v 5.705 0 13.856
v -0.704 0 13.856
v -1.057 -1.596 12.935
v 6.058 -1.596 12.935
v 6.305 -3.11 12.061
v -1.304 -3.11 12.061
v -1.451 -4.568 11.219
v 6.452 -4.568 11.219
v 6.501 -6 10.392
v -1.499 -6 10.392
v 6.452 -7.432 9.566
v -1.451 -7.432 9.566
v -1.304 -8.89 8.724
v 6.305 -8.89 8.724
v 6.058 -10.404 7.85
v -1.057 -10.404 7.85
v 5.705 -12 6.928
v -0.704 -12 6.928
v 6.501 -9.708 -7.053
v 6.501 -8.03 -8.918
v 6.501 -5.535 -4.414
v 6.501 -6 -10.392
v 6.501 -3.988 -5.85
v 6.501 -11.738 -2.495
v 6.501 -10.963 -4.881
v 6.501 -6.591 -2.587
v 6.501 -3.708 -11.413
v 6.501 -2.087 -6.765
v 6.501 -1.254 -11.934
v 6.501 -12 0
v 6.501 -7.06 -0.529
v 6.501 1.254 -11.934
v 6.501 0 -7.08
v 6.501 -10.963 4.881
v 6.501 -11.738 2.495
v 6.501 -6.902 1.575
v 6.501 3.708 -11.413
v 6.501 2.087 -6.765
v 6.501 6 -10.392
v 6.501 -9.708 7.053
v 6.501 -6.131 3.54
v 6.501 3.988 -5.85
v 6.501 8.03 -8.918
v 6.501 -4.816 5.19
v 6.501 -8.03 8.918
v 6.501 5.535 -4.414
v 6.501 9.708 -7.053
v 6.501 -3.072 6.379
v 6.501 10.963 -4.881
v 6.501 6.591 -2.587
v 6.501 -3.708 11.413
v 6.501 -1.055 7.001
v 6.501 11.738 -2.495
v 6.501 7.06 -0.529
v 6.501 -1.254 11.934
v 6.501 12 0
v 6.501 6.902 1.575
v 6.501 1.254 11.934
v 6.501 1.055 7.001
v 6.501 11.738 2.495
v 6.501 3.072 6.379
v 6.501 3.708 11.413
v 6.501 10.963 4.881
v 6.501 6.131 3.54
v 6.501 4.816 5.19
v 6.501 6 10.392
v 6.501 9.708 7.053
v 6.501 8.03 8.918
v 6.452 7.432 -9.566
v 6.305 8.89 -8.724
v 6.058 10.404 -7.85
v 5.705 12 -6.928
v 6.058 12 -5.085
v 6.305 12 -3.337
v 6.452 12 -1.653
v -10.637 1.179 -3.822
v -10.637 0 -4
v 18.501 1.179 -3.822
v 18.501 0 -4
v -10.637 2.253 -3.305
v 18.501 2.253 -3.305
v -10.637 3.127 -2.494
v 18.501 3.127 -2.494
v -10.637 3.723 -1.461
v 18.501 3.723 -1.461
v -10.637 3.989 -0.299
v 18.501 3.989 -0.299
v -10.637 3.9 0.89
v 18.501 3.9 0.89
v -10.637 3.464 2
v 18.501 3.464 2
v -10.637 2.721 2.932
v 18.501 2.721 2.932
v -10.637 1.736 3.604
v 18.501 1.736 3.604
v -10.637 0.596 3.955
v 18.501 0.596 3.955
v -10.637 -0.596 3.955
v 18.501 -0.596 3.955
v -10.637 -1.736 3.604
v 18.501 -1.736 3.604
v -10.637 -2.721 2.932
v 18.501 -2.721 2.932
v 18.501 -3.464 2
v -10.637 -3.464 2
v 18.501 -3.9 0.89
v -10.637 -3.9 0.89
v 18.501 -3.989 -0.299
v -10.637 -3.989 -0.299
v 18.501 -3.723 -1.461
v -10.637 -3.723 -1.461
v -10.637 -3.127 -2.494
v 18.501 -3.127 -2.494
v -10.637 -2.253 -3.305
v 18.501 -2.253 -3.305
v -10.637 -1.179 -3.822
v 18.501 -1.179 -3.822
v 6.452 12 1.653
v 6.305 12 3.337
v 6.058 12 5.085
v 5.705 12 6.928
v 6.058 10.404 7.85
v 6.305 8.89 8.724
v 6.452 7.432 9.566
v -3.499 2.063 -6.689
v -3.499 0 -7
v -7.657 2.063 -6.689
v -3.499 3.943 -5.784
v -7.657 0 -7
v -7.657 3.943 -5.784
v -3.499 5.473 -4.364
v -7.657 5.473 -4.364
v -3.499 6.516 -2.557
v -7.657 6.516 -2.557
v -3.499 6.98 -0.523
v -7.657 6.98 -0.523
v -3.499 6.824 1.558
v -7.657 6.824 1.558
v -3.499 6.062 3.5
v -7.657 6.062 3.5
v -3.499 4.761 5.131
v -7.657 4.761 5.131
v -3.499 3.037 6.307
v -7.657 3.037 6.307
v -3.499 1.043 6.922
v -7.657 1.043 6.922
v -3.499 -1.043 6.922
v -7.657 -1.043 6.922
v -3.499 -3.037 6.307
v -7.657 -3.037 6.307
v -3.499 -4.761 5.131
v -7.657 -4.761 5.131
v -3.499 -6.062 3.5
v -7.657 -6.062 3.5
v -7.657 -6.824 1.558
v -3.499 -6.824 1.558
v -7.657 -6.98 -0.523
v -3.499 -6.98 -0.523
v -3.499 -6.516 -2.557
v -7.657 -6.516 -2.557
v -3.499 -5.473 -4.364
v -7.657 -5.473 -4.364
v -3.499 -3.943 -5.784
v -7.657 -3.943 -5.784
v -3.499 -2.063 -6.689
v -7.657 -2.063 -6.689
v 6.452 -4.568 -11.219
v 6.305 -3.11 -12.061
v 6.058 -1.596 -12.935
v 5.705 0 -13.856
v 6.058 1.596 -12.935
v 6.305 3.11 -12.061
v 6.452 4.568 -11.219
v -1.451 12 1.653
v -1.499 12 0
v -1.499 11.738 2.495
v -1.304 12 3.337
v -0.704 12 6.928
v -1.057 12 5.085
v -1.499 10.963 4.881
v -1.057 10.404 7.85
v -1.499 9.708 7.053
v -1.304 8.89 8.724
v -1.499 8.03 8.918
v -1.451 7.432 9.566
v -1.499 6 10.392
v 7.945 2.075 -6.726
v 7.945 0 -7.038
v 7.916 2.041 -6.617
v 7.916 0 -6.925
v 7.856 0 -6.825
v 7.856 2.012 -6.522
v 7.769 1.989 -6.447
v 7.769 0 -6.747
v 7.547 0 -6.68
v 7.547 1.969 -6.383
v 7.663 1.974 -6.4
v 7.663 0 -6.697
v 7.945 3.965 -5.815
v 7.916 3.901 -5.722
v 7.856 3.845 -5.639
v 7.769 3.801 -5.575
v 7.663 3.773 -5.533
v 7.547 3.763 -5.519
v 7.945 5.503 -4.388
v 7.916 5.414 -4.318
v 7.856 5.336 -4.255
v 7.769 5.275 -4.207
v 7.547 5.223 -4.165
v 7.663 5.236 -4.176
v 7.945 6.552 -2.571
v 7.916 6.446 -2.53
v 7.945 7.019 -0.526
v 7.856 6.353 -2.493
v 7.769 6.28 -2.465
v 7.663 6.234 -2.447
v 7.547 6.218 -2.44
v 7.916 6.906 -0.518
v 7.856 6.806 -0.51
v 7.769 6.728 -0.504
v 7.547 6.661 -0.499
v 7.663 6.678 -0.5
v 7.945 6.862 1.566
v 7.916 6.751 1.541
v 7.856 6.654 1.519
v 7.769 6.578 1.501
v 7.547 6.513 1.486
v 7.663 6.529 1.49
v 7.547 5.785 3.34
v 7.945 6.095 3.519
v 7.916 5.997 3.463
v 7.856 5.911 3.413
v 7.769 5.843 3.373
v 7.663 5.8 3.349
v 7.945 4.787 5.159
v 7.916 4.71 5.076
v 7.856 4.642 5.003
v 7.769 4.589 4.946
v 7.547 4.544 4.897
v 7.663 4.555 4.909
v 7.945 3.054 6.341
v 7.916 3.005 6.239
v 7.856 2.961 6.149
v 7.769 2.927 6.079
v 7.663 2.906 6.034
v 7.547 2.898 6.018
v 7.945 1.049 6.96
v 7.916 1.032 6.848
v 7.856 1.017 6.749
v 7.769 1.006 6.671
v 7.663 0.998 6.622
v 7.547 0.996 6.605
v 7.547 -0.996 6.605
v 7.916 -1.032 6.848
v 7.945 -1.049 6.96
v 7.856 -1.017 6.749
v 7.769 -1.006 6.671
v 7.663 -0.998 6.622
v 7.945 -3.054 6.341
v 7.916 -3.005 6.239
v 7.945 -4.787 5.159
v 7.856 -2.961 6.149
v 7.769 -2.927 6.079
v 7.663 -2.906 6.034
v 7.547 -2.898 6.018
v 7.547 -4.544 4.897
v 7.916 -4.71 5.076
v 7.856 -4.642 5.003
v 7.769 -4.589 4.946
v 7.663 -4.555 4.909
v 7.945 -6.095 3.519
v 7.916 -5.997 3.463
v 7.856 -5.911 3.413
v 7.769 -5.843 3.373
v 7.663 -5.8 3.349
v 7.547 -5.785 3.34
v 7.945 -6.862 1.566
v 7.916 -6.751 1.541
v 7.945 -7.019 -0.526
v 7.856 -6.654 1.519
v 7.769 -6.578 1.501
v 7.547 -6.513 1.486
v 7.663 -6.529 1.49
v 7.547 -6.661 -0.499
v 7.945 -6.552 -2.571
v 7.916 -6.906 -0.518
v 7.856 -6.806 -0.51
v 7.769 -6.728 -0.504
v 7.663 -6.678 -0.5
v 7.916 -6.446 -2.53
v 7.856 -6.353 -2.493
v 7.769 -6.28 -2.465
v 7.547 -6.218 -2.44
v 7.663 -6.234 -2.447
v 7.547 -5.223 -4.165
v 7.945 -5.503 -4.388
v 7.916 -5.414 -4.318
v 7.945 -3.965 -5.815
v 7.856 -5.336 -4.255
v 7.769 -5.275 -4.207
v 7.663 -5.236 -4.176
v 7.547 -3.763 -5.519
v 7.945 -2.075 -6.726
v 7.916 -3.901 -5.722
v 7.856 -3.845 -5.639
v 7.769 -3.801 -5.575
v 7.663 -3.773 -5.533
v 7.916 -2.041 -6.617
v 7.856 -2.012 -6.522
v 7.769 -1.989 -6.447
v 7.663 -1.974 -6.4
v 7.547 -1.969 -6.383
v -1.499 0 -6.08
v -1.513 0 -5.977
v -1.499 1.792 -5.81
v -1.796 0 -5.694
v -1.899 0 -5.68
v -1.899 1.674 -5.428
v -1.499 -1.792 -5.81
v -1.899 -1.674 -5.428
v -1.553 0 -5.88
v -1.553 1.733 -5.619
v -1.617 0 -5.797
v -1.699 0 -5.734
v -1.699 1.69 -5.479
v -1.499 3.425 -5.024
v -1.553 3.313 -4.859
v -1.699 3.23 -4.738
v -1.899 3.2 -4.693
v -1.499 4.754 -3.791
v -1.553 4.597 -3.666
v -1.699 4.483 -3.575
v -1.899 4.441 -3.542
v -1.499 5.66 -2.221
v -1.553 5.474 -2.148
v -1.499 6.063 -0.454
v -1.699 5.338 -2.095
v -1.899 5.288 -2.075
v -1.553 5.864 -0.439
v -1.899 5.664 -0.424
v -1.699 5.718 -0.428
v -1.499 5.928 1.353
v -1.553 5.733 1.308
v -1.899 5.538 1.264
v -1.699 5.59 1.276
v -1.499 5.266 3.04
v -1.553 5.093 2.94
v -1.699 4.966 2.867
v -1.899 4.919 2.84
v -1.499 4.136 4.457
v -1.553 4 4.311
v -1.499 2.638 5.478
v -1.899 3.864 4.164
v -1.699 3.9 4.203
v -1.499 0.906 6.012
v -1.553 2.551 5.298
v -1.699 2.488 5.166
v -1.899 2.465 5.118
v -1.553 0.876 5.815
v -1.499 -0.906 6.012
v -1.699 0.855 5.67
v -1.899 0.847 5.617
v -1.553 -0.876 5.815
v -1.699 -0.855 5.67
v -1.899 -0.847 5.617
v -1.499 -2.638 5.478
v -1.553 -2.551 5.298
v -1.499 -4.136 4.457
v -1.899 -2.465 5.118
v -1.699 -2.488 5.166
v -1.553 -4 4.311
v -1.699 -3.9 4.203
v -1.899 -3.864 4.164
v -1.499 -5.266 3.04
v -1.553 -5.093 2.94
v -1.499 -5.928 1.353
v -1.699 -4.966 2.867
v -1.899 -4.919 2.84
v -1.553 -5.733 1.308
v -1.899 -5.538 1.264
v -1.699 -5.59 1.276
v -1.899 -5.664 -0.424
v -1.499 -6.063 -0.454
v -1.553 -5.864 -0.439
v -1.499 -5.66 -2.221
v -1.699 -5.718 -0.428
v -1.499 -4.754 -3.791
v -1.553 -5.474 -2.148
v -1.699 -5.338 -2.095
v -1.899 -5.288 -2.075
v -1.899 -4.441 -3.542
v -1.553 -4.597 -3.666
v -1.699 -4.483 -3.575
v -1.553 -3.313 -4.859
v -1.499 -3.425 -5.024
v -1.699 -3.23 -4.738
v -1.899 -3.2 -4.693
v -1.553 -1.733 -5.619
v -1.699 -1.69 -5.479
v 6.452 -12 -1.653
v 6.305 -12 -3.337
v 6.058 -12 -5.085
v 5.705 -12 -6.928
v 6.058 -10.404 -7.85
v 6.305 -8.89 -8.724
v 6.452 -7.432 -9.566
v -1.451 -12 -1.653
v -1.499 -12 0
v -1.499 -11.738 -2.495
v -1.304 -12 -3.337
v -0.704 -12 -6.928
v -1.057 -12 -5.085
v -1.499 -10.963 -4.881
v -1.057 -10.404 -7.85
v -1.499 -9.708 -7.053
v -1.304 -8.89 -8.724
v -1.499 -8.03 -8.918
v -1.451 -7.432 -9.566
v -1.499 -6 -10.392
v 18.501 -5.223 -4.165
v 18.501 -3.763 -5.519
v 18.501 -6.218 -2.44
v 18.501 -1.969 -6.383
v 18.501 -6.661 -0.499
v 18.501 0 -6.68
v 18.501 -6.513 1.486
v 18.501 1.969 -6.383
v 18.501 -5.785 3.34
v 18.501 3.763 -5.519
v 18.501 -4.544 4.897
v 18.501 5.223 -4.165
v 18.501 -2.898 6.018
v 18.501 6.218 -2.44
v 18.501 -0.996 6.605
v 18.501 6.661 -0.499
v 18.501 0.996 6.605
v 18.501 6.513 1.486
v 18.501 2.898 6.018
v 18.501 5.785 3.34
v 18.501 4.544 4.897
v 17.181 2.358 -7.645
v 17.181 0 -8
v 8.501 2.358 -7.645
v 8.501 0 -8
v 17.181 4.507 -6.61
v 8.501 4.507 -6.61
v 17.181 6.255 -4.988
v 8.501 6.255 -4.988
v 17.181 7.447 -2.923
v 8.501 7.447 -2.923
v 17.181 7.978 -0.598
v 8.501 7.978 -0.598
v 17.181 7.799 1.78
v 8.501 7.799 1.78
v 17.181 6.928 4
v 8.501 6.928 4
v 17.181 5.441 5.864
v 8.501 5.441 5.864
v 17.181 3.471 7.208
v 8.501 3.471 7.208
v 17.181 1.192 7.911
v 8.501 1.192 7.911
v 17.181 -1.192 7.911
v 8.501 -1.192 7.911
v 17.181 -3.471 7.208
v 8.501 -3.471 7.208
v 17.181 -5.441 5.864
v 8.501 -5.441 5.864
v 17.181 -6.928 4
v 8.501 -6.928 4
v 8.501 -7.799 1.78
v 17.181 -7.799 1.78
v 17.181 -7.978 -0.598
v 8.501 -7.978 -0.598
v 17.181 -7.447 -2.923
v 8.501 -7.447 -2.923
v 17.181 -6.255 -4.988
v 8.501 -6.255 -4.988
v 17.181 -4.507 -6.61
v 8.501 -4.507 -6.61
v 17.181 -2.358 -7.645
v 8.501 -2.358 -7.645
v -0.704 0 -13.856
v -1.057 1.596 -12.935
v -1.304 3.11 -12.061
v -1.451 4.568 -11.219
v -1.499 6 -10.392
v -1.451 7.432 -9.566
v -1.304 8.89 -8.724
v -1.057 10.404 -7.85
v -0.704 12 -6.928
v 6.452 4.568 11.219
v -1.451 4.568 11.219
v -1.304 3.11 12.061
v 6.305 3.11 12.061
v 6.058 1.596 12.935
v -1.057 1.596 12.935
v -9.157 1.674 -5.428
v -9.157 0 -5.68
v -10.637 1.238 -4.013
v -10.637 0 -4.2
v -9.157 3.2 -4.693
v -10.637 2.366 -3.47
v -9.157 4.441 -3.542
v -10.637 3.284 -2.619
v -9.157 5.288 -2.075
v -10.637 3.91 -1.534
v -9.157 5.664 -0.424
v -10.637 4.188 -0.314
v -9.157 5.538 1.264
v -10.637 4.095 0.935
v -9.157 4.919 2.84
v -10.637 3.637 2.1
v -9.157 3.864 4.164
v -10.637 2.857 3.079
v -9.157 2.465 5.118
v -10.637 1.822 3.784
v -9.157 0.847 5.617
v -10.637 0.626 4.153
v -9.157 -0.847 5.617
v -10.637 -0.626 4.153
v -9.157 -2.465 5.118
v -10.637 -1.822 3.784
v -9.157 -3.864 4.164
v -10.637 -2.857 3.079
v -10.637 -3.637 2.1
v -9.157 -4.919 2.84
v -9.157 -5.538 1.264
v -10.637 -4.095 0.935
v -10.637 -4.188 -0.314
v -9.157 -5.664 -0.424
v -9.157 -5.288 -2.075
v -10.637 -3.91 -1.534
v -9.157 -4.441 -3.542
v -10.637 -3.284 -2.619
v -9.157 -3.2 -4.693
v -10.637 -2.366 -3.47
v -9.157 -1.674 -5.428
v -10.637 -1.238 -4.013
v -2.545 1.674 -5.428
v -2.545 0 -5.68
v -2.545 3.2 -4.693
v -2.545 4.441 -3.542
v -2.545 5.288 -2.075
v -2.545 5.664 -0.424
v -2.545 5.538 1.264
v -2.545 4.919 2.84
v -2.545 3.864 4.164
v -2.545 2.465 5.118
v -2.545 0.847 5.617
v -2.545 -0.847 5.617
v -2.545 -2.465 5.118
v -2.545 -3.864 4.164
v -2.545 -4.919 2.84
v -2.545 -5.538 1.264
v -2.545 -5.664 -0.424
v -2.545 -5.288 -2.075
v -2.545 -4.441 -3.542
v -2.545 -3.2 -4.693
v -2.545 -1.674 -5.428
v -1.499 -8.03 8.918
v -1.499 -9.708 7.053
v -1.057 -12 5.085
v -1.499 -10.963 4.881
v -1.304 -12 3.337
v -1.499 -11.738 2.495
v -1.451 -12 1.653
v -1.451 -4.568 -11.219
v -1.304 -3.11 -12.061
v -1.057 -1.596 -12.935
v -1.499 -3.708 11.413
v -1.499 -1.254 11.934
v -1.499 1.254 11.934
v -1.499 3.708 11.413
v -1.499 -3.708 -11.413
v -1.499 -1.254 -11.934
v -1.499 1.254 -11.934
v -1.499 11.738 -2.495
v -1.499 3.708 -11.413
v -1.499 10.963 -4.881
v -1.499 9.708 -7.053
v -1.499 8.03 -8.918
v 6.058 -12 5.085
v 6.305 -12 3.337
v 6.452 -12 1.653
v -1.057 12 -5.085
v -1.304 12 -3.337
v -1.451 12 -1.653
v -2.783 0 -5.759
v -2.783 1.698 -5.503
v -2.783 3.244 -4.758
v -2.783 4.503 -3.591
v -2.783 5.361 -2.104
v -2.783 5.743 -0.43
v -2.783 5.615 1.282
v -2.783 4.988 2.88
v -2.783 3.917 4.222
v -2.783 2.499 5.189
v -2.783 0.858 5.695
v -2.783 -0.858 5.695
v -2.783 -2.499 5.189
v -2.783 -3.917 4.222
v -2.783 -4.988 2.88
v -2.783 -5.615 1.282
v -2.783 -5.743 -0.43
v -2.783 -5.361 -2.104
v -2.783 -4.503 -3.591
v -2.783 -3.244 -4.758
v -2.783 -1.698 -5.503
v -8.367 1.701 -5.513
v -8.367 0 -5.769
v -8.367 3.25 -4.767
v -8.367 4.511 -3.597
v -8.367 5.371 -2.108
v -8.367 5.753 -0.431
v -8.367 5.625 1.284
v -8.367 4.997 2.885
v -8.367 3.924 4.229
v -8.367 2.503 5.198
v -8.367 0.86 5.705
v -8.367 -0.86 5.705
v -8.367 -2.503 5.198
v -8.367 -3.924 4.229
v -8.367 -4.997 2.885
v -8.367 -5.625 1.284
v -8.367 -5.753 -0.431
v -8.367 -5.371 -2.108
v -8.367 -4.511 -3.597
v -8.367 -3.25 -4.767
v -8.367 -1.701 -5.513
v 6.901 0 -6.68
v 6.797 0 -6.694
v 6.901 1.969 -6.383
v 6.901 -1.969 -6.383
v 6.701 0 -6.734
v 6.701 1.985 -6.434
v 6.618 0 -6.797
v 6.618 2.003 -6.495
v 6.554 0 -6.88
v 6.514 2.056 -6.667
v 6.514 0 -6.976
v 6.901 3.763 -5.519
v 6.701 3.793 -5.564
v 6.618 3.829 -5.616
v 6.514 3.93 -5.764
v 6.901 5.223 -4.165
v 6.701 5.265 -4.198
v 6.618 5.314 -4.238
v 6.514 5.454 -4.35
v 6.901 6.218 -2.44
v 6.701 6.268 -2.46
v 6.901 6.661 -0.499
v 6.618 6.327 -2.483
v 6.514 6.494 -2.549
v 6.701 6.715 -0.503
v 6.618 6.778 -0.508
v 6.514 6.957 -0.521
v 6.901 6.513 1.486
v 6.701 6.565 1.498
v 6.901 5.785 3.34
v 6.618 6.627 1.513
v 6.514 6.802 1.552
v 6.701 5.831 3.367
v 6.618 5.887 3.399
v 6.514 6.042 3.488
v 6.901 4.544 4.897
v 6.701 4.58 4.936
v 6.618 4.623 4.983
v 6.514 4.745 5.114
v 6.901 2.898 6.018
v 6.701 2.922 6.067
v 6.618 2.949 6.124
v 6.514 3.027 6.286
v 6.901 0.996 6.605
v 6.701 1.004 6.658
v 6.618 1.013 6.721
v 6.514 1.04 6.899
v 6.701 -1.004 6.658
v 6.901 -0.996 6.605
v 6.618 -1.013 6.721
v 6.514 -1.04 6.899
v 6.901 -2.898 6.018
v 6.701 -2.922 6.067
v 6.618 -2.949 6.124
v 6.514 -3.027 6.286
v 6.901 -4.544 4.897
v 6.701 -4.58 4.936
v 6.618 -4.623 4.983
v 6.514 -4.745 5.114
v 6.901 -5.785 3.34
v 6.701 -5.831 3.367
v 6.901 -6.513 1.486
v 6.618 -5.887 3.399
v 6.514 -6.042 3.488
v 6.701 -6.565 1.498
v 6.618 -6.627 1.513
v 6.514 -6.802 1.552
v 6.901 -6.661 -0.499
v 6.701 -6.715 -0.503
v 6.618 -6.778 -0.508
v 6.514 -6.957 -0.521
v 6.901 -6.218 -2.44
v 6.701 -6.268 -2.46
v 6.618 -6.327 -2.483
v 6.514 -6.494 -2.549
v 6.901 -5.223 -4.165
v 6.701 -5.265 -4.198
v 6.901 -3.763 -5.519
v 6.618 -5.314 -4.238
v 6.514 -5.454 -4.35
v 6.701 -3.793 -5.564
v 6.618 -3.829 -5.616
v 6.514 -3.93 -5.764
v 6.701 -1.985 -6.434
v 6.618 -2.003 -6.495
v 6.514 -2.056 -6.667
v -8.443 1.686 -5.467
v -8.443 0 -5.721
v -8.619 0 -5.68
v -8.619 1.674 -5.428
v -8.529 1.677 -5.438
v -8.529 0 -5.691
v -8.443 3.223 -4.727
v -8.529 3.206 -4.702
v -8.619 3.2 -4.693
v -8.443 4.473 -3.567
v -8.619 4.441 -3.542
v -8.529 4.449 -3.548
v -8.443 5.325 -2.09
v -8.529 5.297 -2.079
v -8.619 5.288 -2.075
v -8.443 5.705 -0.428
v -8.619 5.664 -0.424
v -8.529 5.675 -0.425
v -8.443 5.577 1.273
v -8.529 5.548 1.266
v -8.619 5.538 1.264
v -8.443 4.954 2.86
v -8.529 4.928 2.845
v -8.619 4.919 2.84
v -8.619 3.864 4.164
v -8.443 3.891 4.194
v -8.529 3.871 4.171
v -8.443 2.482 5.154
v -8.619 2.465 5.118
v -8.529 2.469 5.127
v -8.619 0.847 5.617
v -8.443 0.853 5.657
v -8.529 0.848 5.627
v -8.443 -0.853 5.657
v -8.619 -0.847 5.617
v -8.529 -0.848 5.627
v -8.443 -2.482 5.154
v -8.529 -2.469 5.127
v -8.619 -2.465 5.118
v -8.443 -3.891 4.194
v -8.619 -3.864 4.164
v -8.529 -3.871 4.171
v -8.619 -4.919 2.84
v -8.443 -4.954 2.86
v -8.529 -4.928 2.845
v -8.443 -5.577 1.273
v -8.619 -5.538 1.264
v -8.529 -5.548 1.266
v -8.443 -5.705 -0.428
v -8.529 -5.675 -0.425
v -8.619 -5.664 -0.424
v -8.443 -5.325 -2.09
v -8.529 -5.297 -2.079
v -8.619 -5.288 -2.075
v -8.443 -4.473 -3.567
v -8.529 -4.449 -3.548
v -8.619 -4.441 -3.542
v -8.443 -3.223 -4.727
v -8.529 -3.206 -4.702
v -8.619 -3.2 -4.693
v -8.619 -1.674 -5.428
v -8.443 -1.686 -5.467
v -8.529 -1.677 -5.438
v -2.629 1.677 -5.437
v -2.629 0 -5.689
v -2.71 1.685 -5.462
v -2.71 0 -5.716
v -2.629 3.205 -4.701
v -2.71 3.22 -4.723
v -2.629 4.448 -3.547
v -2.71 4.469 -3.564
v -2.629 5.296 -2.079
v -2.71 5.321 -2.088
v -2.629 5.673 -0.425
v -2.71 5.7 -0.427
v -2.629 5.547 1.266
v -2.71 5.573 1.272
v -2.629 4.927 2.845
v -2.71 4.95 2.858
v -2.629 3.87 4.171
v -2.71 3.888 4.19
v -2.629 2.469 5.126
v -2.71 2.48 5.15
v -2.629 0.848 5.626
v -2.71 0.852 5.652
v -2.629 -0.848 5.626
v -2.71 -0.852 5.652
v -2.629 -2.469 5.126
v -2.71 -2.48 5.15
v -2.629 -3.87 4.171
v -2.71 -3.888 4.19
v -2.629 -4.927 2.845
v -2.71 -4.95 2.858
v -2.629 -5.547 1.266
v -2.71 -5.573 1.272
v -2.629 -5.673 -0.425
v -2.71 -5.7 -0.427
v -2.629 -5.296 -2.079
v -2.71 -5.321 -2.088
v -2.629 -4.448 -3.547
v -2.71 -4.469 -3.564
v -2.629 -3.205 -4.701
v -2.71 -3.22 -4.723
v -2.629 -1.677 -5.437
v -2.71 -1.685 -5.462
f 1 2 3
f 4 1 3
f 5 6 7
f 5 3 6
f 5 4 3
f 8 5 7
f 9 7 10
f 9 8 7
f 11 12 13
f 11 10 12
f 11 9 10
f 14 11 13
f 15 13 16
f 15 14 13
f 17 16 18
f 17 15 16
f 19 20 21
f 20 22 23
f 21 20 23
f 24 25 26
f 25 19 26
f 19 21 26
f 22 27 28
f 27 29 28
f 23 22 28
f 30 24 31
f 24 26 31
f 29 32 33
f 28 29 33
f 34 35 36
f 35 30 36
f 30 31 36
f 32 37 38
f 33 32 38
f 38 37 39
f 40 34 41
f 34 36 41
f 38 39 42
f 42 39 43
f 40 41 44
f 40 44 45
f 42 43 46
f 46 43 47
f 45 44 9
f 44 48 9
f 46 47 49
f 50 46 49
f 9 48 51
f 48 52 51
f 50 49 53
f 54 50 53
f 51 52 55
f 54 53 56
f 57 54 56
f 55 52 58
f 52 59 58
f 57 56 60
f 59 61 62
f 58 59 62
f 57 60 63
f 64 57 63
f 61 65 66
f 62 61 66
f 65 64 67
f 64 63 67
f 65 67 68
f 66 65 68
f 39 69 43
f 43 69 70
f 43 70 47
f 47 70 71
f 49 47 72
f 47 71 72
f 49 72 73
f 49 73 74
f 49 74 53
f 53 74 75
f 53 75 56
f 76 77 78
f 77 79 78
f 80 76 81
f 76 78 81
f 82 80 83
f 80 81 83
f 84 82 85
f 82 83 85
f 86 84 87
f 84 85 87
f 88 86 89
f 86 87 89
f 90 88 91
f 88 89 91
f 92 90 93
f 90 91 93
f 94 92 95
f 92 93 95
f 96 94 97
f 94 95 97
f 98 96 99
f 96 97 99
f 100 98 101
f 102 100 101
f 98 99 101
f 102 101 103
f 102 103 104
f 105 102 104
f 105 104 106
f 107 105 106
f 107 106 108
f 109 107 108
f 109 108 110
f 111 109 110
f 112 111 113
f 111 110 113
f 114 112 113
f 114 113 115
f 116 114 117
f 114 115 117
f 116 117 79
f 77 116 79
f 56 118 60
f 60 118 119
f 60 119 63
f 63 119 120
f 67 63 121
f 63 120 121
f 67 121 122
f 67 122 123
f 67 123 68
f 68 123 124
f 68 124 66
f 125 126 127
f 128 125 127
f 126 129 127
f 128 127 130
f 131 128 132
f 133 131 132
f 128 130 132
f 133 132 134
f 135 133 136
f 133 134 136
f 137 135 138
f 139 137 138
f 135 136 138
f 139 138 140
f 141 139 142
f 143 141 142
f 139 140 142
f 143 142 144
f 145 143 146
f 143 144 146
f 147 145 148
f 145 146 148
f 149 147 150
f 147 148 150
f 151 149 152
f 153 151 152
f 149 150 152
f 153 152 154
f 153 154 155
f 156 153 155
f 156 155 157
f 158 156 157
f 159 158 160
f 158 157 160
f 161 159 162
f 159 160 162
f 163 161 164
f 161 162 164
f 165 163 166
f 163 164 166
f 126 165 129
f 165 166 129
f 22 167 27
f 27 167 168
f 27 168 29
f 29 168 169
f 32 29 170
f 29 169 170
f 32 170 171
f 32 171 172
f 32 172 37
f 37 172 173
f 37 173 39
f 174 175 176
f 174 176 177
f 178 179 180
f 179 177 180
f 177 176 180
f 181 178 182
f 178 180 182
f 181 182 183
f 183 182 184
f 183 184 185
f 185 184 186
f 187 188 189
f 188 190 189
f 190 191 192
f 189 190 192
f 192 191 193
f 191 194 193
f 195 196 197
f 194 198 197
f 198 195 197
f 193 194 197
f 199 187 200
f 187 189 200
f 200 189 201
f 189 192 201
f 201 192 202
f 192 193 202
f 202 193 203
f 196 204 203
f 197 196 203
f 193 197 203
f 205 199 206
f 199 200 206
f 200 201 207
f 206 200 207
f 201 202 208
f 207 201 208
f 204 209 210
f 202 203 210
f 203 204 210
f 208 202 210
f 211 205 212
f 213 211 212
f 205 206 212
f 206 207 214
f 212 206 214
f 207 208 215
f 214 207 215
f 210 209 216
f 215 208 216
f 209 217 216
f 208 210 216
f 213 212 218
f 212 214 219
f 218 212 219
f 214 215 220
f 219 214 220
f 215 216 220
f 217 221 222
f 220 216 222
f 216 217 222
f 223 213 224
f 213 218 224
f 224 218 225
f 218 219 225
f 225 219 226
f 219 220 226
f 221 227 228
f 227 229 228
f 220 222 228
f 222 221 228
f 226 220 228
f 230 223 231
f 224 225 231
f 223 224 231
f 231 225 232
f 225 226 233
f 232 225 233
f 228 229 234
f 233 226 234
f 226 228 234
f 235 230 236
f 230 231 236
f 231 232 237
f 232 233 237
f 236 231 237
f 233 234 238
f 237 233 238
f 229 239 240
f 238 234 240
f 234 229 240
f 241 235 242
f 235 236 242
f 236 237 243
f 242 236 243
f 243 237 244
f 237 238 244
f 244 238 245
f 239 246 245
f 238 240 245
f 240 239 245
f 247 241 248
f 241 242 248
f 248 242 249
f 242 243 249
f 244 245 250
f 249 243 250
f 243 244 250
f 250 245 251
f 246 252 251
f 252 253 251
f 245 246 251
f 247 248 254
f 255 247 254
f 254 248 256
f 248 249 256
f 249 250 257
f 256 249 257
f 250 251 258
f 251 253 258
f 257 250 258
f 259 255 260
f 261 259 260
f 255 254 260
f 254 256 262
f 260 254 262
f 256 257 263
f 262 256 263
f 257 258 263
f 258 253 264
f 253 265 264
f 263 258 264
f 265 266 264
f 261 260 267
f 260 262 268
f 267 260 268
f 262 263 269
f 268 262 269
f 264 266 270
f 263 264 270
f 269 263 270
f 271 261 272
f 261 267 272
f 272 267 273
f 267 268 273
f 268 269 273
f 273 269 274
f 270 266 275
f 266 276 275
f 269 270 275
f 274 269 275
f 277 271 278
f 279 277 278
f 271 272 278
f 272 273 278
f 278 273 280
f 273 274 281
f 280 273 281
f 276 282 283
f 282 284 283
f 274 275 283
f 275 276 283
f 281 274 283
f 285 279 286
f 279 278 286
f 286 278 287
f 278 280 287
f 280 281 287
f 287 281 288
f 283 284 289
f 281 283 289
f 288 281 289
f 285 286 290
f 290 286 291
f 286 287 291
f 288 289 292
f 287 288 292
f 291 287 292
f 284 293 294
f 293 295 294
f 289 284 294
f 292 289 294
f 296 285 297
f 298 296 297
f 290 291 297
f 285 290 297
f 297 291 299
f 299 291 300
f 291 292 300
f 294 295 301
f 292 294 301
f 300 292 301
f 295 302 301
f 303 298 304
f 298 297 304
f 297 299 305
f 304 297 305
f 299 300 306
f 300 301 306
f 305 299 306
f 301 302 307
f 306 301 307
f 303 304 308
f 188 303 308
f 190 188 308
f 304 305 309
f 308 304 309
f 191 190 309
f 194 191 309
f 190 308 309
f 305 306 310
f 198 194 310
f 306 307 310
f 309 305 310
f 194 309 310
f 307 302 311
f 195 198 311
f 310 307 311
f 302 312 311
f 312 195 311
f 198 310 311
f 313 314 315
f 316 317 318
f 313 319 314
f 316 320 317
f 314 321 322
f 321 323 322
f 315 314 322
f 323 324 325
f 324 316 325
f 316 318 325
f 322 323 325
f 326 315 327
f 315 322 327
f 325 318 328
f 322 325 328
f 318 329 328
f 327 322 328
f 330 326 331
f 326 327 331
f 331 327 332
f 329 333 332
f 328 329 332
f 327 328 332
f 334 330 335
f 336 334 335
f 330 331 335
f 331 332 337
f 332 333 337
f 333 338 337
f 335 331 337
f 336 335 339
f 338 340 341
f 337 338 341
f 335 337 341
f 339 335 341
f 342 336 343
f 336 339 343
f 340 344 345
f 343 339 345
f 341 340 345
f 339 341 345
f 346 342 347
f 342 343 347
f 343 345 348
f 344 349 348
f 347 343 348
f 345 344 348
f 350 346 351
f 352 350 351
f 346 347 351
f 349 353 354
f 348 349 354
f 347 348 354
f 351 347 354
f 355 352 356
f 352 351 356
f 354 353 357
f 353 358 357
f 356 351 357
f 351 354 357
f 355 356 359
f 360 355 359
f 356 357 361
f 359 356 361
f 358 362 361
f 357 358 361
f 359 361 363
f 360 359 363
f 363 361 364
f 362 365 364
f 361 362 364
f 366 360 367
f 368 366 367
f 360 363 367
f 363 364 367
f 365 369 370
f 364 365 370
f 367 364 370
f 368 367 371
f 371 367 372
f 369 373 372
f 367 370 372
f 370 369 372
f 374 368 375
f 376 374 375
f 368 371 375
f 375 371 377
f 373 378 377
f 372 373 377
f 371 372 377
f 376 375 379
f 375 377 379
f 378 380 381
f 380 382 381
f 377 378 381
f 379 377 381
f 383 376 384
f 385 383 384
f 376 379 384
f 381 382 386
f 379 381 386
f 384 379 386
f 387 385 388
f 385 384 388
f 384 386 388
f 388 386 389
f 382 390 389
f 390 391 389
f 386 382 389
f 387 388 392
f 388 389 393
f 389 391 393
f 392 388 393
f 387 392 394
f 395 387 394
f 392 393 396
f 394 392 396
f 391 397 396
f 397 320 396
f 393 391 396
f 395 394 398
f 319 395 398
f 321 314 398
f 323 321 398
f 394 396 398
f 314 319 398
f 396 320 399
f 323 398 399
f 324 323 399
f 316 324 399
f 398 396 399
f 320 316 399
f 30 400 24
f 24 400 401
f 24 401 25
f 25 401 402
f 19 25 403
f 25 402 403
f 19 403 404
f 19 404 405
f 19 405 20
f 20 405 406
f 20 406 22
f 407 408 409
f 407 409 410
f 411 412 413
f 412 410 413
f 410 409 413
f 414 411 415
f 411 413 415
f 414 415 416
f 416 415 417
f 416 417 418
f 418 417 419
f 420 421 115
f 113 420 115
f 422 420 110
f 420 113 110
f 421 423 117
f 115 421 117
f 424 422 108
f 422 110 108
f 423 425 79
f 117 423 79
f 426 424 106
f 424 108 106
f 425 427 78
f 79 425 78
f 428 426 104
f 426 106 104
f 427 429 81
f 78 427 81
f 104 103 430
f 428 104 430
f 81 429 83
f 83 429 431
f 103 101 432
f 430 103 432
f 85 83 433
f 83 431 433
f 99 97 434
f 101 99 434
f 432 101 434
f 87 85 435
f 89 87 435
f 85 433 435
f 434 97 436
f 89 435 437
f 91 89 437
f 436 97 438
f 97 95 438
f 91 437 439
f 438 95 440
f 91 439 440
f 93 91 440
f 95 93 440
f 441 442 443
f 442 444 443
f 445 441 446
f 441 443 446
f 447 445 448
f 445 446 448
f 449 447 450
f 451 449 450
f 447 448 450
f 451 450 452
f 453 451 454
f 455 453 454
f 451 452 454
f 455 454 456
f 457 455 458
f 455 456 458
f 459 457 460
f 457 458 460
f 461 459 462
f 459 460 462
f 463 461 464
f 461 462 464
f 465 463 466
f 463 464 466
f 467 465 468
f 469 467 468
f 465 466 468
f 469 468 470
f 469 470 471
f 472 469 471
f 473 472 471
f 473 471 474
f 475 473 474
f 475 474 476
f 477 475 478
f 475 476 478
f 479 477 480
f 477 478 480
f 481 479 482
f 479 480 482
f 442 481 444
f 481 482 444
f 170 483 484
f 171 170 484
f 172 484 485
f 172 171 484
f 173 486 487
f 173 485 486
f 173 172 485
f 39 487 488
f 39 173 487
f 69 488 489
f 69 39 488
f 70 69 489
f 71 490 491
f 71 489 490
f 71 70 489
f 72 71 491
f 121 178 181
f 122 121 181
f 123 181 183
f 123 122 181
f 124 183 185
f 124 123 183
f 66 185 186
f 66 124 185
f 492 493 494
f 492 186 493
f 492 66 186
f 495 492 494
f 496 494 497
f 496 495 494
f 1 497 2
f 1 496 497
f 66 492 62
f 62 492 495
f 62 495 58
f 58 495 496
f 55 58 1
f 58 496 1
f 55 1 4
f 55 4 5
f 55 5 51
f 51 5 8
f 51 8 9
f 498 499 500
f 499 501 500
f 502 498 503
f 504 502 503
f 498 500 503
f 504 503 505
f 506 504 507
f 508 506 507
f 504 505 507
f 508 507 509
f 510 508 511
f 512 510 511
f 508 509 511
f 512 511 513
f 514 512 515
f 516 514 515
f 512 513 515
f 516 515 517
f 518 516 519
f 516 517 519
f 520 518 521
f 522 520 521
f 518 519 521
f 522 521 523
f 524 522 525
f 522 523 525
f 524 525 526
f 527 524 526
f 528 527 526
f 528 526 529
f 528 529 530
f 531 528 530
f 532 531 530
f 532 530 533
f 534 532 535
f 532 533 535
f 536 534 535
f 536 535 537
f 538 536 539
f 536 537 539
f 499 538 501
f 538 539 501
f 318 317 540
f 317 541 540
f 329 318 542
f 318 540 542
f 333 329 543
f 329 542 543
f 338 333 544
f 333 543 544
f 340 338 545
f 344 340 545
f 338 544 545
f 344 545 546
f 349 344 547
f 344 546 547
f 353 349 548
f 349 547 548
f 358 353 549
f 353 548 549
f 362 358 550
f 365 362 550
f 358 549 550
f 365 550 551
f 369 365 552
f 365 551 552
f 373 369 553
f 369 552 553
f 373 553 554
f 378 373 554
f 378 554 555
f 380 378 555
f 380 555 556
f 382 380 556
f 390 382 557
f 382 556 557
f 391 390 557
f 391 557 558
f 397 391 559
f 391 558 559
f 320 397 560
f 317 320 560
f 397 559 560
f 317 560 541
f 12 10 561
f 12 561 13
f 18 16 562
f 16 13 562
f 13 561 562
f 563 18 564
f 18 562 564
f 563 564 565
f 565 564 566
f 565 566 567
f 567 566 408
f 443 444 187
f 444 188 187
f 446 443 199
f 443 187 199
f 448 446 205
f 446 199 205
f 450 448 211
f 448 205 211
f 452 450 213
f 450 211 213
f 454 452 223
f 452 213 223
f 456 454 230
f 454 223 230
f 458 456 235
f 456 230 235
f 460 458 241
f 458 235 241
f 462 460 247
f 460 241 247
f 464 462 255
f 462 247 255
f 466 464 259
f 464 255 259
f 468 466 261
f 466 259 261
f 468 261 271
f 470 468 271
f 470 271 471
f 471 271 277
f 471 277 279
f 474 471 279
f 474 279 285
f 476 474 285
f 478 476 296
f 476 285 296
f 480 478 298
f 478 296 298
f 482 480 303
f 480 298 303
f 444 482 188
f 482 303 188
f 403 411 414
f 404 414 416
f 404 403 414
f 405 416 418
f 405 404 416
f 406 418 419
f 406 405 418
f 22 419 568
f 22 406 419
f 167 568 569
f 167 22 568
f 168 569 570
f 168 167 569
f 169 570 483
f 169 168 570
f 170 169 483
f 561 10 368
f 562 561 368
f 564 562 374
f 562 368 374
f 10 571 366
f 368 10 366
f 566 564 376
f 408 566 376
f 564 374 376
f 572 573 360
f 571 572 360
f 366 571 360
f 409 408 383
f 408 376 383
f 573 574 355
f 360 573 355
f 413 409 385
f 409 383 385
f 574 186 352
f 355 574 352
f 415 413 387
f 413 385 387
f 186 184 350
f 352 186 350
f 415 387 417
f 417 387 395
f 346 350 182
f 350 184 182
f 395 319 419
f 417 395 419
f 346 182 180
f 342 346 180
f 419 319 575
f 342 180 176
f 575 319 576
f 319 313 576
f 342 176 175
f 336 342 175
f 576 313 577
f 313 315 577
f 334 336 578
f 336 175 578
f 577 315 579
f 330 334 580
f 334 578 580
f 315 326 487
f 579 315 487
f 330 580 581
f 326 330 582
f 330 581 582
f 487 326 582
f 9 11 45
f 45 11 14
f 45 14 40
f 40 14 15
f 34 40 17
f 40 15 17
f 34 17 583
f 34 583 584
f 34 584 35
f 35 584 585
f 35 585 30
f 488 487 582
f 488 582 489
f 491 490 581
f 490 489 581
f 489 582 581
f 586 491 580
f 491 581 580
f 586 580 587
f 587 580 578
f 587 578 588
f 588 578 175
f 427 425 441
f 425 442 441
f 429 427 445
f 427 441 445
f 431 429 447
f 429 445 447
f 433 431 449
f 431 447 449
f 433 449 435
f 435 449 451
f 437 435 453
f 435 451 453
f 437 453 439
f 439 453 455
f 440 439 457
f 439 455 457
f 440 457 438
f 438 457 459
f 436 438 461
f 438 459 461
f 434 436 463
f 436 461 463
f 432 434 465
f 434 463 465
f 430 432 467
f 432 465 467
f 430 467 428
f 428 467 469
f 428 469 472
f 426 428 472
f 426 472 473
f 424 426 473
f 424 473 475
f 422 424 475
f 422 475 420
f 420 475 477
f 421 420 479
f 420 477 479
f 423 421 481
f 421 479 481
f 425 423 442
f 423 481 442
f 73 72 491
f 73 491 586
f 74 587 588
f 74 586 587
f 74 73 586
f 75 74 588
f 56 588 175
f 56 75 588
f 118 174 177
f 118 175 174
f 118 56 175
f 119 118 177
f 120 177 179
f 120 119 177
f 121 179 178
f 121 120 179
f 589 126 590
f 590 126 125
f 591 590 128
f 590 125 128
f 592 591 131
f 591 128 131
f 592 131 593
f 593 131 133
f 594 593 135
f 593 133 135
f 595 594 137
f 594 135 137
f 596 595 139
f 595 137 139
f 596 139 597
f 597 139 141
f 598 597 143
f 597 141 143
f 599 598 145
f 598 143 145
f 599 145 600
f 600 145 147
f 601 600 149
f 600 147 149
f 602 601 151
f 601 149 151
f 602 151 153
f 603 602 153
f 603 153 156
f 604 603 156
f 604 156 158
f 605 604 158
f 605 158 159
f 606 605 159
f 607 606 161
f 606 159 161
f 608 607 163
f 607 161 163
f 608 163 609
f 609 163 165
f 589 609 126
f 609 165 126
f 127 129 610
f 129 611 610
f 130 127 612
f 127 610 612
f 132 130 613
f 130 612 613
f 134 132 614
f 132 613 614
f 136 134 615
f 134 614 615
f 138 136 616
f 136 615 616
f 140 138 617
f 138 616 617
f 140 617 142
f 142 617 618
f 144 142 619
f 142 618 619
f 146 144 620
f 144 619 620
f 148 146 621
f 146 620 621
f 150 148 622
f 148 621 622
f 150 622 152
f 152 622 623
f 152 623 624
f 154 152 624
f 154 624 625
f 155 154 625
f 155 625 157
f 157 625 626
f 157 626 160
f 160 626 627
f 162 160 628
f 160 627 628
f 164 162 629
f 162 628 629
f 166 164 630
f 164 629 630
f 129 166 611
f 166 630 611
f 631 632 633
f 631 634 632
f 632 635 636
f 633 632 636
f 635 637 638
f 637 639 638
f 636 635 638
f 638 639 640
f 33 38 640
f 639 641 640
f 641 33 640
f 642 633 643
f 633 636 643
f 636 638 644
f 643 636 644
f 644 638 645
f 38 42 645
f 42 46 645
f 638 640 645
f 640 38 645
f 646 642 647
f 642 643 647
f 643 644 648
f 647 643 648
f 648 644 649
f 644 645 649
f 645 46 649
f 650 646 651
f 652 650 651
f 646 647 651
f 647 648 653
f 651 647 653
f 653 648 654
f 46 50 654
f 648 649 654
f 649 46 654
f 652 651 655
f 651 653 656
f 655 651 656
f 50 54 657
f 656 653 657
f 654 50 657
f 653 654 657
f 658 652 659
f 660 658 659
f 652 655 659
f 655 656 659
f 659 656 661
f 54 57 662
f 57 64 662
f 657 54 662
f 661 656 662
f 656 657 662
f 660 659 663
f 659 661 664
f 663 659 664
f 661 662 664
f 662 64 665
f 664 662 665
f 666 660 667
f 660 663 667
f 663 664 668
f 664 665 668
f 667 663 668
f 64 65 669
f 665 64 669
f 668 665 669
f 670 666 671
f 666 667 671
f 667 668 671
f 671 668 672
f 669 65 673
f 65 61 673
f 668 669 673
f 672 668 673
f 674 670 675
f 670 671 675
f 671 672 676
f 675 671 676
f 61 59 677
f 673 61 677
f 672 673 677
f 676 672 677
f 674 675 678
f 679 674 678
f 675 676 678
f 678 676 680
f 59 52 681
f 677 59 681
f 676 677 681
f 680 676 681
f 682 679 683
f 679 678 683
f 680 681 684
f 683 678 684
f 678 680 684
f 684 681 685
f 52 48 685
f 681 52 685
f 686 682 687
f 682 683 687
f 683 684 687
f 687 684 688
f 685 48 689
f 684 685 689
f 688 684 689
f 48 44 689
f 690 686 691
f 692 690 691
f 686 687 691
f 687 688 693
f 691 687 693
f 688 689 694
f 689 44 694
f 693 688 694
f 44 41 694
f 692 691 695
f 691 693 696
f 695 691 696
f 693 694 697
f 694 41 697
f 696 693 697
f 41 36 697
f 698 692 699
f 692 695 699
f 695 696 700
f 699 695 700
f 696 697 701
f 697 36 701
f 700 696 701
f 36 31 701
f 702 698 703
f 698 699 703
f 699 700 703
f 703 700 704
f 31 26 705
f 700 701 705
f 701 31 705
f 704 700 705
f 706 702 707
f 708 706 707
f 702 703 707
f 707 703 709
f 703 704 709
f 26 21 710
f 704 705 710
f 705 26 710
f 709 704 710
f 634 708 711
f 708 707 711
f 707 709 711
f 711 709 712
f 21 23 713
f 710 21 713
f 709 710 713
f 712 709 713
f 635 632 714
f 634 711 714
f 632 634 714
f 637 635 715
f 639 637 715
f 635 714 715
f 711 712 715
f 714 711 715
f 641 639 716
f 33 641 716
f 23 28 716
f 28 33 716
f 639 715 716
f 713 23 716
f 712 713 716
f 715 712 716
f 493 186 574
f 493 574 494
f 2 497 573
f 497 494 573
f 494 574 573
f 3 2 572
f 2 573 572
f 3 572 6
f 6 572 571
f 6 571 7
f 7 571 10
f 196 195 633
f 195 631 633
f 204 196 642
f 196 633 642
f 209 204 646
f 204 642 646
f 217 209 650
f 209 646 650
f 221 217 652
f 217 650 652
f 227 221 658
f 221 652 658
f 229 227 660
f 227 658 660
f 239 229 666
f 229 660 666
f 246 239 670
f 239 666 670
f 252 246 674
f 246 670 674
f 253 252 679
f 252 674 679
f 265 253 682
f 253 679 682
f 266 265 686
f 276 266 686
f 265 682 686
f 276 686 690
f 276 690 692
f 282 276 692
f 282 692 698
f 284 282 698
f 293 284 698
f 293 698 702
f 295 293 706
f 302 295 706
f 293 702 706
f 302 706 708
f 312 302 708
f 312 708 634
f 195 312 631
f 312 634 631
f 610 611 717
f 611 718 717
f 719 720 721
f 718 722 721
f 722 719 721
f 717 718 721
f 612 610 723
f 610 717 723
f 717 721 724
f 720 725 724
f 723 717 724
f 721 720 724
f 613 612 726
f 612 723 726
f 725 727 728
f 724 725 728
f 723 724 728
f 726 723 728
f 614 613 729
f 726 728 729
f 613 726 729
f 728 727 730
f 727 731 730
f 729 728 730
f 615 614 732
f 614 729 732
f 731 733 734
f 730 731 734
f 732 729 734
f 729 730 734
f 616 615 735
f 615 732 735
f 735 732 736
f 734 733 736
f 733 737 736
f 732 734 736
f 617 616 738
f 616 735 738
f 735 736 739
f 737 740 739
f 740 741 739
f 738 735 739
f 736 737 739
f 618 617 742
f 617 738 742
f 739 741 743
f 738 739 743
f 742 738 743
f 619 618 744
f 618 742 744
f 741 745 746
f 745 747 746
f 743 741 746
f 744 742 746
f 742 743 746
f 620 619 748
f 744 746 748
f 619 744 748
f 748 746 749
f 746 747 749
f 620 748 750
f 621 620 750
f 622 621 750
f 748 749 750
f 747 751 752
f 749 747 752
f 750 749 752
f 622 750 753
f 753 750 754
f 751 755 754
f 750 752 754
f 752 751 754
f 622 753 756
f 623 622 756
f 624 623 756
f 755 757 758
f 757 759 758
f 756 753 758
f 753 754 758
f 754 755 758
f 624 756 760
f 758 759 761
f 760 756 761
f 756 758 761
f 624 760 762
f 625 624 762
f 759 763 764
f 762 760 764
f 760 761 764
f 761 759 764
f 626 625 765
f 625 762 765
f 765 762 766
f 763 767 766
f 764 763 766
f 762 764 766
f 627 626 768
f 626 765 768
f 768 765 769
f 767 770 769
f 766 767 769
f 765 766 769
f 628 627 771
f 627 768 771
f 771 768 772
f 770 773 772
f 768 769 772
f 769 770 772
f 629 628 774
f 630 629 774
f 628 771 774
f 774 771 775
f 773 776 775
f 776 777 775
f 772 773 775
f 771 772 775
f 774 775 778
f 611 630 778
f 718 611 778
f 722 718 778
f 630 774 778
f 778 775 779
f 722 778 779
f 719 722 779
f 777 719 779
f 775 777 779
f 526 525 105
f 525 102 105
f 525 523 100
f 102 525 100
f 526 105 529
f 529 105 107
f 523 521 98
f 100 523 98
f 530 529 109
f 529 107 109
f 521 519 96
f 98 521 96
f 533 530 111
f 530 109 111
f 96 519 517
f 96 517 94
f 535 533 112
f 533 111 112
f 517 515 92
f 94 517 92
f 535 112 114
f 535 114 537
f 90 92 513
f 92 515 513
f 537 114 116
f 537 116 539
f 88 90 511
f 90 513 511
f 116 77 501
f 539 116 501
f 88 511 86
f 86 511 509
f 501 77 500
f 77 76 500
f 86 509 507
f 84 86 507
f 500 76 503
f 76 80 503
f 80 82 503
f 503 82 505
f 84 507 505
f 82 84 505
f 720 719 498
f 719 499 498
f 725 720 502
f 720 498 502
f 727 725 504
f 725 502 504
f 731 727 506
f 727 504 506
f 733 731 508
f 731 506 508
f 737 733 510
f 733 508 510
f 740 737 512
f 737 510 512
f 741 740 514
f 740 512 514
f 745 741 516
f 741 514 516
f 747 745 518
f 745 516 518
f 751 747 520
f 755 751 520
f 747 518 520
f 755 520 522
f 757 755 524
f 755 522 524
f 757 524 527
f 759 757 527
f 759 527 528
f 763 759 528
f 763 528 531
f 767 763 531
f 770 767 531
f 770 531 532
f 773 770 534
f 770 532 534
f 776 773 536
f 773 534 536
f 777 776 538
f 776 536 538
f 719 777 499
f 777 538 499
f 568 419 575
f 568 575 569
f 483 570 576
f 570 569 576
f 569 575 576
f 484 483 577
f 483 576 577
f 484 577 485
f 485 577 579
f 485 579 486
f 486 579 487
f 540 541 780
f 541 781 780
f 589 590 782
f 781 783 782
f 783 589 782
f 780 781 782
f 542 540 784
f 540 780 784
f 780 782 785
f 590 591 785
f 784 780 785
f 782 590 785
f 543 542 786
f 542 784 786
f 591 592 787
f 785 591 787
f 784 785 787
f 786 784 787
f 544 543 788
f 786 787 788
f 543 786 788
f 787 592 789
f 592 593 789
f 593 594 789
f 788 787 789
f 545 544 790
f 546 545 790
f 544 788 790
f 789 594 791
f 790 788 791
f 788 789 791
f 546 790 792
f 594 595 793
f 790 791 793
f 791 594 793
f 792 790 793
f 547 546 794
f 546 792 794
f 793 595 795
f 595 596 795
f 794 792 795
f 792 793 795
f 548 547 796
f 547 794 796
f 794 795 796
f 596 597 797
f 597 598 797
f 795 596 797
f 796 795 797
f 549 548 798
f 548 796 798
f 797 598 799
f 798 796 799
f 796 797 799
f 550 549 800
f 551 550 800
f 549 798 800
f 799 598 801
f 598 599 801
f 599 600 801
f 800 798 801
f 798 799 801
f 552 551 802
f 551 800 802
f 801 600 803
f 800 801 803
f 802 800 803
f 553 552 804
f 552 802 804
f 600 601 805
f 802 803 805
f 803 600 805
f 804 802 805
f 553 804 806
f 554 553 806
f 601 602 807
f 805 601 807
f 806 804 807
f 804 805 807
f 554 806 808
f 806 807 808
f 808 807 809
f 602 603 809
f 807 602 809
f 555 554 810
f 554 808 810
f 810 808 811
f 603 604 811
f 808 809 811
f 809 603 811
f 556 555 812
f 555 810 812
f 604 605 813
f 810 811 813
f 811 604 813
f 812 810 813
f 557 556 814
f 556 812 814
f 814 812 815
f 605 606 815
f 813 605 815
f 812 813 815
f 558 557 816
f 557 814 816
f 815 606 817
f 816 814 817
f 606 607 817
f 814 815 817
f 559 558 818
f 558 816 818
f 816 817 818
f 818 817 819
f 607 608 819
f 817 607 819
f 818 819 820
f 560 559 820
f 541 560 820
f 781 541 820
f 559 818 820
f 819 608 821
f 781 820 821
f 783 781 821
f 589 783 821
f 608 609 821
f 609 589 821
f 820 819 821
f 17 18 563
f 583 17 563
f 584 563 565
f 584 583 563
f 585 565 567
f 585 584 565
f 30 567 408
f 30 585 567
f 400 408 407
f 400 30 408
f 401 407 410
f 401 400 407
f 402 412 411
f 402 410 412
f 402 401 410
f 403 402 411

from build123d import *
from build123d.topology import SkipClean

# Parameters (mm, degrees)
CUT_EXTRUDE1_DEPTH = 34.496268449
CIRPATTERN1_COUNT  = 6


with BuildPart() as part:
    # Sketch1 → Revolve1 (revolve)
    with BuildSketch(Plane(origin=(0, 0, 0), x_dir=(1, 0, 0), z_dir=(0, 1, 0))):
        with BuildLine():
            Line((6.500562053, 7.08), (6.500562053, 12))
            Line((6.500562053, 12), (3.500562053, 19))
            Line((3.500562053, 19), (1.500562053, 19))
            Line((1.500562053, 19), (-1.499437947, 12))
            Line((-1.499437947, 12), (-1.499437947, 6.08031838))
            ThreePointArc((-1.499437947, 6.08031838), (-1.616595234, 5.797475668), (-1.899437947, 5.68031838))
            Line((-1.899437947, 5.68031838), (-2.544567646, 5.68031838))
            ThreePointArc((-2.544567646, 5.68031838), (-2.670163765, 5.700547903), (-2.783056135, 5.759190305))
            Line((-2.783056135, 5.759190305), (-3.499437947, 7))
            Line((-3.499437947, 7), (-7.656522503, 7))
            Line((-7.656522503, 7), (-8.366963495, 5.769480105))
            ThreePointArc((-8.366963495, 5.769480105), (-8.485178679, 5.703267117), (-8.618716483, 5.68031838))
            Line((-8.618716483, 5.68031838), (-9.156522503, 5.68031838))
            Line((-9.156522503, 5.68031838), (-10.636840883, 4.2))
            Line((-10.636840883, 4.2), (-10.636840883, 4))
            Line((-10.636840883, 4), (18.500562053, 4))
            Line((18.500562053, 4), (18.500562053, 6.68))
            Line((18.500562053, 6.68), (17.180562053, 8))
            Line((17.180562053, 8), (8.500562053, 8))
            Line((8.500562053, 8), (7.945301013, 7.038259666))
            ThreePointArc((7.945301013, 7.038259666), (7.81516358, 6.782765973), (7.547484793, 6.68))
            Line((7.547484793, 6.68), (6.900562053, 6.68))
            ThreePointArc((6.900562053, 6.68), (6.617719341, 6.797157288), (6.500562053, 7.08))
        make_face()
    revolve(axis=Axis((-84.410714624, 0, 0), (1, 0, 0)))

    # Sketch2 → Cut-Extrude1 (cut, symmetric)
    with SkipClean():  # the faces are left unmerged after this step: merging them gives an invalid solid
        with BuildSketch(Plane.ZY.offset(1.499437947)):
            Polygon((-116.355697184, 12), (-14.730919863, 12), (14.730919863, 12), (116.355697184, 12), (116.355697184, 215.249554642), (-116.355697184, 215.249554642), align=None)
        cut_extrude1 = extrude(amount=CUT_EXTRUDE1_DEPTH, both=True, mode=Mode.SUBTRACT)

    # CirPattern1: Cut-Extrude1 ×6 about axis
    cirpattern1_axis = Axis((-84.410714624, 0, 0), (1, 0, 0))
    for i in range(1, CIRPATTERN1_COUNT):
        add(cut_extrude1.rotate(cirpattern1_axis, i * 360 / CIRPATTERN1_COUNT), mode=Mode.SUBTRACT)


solid = part.part
